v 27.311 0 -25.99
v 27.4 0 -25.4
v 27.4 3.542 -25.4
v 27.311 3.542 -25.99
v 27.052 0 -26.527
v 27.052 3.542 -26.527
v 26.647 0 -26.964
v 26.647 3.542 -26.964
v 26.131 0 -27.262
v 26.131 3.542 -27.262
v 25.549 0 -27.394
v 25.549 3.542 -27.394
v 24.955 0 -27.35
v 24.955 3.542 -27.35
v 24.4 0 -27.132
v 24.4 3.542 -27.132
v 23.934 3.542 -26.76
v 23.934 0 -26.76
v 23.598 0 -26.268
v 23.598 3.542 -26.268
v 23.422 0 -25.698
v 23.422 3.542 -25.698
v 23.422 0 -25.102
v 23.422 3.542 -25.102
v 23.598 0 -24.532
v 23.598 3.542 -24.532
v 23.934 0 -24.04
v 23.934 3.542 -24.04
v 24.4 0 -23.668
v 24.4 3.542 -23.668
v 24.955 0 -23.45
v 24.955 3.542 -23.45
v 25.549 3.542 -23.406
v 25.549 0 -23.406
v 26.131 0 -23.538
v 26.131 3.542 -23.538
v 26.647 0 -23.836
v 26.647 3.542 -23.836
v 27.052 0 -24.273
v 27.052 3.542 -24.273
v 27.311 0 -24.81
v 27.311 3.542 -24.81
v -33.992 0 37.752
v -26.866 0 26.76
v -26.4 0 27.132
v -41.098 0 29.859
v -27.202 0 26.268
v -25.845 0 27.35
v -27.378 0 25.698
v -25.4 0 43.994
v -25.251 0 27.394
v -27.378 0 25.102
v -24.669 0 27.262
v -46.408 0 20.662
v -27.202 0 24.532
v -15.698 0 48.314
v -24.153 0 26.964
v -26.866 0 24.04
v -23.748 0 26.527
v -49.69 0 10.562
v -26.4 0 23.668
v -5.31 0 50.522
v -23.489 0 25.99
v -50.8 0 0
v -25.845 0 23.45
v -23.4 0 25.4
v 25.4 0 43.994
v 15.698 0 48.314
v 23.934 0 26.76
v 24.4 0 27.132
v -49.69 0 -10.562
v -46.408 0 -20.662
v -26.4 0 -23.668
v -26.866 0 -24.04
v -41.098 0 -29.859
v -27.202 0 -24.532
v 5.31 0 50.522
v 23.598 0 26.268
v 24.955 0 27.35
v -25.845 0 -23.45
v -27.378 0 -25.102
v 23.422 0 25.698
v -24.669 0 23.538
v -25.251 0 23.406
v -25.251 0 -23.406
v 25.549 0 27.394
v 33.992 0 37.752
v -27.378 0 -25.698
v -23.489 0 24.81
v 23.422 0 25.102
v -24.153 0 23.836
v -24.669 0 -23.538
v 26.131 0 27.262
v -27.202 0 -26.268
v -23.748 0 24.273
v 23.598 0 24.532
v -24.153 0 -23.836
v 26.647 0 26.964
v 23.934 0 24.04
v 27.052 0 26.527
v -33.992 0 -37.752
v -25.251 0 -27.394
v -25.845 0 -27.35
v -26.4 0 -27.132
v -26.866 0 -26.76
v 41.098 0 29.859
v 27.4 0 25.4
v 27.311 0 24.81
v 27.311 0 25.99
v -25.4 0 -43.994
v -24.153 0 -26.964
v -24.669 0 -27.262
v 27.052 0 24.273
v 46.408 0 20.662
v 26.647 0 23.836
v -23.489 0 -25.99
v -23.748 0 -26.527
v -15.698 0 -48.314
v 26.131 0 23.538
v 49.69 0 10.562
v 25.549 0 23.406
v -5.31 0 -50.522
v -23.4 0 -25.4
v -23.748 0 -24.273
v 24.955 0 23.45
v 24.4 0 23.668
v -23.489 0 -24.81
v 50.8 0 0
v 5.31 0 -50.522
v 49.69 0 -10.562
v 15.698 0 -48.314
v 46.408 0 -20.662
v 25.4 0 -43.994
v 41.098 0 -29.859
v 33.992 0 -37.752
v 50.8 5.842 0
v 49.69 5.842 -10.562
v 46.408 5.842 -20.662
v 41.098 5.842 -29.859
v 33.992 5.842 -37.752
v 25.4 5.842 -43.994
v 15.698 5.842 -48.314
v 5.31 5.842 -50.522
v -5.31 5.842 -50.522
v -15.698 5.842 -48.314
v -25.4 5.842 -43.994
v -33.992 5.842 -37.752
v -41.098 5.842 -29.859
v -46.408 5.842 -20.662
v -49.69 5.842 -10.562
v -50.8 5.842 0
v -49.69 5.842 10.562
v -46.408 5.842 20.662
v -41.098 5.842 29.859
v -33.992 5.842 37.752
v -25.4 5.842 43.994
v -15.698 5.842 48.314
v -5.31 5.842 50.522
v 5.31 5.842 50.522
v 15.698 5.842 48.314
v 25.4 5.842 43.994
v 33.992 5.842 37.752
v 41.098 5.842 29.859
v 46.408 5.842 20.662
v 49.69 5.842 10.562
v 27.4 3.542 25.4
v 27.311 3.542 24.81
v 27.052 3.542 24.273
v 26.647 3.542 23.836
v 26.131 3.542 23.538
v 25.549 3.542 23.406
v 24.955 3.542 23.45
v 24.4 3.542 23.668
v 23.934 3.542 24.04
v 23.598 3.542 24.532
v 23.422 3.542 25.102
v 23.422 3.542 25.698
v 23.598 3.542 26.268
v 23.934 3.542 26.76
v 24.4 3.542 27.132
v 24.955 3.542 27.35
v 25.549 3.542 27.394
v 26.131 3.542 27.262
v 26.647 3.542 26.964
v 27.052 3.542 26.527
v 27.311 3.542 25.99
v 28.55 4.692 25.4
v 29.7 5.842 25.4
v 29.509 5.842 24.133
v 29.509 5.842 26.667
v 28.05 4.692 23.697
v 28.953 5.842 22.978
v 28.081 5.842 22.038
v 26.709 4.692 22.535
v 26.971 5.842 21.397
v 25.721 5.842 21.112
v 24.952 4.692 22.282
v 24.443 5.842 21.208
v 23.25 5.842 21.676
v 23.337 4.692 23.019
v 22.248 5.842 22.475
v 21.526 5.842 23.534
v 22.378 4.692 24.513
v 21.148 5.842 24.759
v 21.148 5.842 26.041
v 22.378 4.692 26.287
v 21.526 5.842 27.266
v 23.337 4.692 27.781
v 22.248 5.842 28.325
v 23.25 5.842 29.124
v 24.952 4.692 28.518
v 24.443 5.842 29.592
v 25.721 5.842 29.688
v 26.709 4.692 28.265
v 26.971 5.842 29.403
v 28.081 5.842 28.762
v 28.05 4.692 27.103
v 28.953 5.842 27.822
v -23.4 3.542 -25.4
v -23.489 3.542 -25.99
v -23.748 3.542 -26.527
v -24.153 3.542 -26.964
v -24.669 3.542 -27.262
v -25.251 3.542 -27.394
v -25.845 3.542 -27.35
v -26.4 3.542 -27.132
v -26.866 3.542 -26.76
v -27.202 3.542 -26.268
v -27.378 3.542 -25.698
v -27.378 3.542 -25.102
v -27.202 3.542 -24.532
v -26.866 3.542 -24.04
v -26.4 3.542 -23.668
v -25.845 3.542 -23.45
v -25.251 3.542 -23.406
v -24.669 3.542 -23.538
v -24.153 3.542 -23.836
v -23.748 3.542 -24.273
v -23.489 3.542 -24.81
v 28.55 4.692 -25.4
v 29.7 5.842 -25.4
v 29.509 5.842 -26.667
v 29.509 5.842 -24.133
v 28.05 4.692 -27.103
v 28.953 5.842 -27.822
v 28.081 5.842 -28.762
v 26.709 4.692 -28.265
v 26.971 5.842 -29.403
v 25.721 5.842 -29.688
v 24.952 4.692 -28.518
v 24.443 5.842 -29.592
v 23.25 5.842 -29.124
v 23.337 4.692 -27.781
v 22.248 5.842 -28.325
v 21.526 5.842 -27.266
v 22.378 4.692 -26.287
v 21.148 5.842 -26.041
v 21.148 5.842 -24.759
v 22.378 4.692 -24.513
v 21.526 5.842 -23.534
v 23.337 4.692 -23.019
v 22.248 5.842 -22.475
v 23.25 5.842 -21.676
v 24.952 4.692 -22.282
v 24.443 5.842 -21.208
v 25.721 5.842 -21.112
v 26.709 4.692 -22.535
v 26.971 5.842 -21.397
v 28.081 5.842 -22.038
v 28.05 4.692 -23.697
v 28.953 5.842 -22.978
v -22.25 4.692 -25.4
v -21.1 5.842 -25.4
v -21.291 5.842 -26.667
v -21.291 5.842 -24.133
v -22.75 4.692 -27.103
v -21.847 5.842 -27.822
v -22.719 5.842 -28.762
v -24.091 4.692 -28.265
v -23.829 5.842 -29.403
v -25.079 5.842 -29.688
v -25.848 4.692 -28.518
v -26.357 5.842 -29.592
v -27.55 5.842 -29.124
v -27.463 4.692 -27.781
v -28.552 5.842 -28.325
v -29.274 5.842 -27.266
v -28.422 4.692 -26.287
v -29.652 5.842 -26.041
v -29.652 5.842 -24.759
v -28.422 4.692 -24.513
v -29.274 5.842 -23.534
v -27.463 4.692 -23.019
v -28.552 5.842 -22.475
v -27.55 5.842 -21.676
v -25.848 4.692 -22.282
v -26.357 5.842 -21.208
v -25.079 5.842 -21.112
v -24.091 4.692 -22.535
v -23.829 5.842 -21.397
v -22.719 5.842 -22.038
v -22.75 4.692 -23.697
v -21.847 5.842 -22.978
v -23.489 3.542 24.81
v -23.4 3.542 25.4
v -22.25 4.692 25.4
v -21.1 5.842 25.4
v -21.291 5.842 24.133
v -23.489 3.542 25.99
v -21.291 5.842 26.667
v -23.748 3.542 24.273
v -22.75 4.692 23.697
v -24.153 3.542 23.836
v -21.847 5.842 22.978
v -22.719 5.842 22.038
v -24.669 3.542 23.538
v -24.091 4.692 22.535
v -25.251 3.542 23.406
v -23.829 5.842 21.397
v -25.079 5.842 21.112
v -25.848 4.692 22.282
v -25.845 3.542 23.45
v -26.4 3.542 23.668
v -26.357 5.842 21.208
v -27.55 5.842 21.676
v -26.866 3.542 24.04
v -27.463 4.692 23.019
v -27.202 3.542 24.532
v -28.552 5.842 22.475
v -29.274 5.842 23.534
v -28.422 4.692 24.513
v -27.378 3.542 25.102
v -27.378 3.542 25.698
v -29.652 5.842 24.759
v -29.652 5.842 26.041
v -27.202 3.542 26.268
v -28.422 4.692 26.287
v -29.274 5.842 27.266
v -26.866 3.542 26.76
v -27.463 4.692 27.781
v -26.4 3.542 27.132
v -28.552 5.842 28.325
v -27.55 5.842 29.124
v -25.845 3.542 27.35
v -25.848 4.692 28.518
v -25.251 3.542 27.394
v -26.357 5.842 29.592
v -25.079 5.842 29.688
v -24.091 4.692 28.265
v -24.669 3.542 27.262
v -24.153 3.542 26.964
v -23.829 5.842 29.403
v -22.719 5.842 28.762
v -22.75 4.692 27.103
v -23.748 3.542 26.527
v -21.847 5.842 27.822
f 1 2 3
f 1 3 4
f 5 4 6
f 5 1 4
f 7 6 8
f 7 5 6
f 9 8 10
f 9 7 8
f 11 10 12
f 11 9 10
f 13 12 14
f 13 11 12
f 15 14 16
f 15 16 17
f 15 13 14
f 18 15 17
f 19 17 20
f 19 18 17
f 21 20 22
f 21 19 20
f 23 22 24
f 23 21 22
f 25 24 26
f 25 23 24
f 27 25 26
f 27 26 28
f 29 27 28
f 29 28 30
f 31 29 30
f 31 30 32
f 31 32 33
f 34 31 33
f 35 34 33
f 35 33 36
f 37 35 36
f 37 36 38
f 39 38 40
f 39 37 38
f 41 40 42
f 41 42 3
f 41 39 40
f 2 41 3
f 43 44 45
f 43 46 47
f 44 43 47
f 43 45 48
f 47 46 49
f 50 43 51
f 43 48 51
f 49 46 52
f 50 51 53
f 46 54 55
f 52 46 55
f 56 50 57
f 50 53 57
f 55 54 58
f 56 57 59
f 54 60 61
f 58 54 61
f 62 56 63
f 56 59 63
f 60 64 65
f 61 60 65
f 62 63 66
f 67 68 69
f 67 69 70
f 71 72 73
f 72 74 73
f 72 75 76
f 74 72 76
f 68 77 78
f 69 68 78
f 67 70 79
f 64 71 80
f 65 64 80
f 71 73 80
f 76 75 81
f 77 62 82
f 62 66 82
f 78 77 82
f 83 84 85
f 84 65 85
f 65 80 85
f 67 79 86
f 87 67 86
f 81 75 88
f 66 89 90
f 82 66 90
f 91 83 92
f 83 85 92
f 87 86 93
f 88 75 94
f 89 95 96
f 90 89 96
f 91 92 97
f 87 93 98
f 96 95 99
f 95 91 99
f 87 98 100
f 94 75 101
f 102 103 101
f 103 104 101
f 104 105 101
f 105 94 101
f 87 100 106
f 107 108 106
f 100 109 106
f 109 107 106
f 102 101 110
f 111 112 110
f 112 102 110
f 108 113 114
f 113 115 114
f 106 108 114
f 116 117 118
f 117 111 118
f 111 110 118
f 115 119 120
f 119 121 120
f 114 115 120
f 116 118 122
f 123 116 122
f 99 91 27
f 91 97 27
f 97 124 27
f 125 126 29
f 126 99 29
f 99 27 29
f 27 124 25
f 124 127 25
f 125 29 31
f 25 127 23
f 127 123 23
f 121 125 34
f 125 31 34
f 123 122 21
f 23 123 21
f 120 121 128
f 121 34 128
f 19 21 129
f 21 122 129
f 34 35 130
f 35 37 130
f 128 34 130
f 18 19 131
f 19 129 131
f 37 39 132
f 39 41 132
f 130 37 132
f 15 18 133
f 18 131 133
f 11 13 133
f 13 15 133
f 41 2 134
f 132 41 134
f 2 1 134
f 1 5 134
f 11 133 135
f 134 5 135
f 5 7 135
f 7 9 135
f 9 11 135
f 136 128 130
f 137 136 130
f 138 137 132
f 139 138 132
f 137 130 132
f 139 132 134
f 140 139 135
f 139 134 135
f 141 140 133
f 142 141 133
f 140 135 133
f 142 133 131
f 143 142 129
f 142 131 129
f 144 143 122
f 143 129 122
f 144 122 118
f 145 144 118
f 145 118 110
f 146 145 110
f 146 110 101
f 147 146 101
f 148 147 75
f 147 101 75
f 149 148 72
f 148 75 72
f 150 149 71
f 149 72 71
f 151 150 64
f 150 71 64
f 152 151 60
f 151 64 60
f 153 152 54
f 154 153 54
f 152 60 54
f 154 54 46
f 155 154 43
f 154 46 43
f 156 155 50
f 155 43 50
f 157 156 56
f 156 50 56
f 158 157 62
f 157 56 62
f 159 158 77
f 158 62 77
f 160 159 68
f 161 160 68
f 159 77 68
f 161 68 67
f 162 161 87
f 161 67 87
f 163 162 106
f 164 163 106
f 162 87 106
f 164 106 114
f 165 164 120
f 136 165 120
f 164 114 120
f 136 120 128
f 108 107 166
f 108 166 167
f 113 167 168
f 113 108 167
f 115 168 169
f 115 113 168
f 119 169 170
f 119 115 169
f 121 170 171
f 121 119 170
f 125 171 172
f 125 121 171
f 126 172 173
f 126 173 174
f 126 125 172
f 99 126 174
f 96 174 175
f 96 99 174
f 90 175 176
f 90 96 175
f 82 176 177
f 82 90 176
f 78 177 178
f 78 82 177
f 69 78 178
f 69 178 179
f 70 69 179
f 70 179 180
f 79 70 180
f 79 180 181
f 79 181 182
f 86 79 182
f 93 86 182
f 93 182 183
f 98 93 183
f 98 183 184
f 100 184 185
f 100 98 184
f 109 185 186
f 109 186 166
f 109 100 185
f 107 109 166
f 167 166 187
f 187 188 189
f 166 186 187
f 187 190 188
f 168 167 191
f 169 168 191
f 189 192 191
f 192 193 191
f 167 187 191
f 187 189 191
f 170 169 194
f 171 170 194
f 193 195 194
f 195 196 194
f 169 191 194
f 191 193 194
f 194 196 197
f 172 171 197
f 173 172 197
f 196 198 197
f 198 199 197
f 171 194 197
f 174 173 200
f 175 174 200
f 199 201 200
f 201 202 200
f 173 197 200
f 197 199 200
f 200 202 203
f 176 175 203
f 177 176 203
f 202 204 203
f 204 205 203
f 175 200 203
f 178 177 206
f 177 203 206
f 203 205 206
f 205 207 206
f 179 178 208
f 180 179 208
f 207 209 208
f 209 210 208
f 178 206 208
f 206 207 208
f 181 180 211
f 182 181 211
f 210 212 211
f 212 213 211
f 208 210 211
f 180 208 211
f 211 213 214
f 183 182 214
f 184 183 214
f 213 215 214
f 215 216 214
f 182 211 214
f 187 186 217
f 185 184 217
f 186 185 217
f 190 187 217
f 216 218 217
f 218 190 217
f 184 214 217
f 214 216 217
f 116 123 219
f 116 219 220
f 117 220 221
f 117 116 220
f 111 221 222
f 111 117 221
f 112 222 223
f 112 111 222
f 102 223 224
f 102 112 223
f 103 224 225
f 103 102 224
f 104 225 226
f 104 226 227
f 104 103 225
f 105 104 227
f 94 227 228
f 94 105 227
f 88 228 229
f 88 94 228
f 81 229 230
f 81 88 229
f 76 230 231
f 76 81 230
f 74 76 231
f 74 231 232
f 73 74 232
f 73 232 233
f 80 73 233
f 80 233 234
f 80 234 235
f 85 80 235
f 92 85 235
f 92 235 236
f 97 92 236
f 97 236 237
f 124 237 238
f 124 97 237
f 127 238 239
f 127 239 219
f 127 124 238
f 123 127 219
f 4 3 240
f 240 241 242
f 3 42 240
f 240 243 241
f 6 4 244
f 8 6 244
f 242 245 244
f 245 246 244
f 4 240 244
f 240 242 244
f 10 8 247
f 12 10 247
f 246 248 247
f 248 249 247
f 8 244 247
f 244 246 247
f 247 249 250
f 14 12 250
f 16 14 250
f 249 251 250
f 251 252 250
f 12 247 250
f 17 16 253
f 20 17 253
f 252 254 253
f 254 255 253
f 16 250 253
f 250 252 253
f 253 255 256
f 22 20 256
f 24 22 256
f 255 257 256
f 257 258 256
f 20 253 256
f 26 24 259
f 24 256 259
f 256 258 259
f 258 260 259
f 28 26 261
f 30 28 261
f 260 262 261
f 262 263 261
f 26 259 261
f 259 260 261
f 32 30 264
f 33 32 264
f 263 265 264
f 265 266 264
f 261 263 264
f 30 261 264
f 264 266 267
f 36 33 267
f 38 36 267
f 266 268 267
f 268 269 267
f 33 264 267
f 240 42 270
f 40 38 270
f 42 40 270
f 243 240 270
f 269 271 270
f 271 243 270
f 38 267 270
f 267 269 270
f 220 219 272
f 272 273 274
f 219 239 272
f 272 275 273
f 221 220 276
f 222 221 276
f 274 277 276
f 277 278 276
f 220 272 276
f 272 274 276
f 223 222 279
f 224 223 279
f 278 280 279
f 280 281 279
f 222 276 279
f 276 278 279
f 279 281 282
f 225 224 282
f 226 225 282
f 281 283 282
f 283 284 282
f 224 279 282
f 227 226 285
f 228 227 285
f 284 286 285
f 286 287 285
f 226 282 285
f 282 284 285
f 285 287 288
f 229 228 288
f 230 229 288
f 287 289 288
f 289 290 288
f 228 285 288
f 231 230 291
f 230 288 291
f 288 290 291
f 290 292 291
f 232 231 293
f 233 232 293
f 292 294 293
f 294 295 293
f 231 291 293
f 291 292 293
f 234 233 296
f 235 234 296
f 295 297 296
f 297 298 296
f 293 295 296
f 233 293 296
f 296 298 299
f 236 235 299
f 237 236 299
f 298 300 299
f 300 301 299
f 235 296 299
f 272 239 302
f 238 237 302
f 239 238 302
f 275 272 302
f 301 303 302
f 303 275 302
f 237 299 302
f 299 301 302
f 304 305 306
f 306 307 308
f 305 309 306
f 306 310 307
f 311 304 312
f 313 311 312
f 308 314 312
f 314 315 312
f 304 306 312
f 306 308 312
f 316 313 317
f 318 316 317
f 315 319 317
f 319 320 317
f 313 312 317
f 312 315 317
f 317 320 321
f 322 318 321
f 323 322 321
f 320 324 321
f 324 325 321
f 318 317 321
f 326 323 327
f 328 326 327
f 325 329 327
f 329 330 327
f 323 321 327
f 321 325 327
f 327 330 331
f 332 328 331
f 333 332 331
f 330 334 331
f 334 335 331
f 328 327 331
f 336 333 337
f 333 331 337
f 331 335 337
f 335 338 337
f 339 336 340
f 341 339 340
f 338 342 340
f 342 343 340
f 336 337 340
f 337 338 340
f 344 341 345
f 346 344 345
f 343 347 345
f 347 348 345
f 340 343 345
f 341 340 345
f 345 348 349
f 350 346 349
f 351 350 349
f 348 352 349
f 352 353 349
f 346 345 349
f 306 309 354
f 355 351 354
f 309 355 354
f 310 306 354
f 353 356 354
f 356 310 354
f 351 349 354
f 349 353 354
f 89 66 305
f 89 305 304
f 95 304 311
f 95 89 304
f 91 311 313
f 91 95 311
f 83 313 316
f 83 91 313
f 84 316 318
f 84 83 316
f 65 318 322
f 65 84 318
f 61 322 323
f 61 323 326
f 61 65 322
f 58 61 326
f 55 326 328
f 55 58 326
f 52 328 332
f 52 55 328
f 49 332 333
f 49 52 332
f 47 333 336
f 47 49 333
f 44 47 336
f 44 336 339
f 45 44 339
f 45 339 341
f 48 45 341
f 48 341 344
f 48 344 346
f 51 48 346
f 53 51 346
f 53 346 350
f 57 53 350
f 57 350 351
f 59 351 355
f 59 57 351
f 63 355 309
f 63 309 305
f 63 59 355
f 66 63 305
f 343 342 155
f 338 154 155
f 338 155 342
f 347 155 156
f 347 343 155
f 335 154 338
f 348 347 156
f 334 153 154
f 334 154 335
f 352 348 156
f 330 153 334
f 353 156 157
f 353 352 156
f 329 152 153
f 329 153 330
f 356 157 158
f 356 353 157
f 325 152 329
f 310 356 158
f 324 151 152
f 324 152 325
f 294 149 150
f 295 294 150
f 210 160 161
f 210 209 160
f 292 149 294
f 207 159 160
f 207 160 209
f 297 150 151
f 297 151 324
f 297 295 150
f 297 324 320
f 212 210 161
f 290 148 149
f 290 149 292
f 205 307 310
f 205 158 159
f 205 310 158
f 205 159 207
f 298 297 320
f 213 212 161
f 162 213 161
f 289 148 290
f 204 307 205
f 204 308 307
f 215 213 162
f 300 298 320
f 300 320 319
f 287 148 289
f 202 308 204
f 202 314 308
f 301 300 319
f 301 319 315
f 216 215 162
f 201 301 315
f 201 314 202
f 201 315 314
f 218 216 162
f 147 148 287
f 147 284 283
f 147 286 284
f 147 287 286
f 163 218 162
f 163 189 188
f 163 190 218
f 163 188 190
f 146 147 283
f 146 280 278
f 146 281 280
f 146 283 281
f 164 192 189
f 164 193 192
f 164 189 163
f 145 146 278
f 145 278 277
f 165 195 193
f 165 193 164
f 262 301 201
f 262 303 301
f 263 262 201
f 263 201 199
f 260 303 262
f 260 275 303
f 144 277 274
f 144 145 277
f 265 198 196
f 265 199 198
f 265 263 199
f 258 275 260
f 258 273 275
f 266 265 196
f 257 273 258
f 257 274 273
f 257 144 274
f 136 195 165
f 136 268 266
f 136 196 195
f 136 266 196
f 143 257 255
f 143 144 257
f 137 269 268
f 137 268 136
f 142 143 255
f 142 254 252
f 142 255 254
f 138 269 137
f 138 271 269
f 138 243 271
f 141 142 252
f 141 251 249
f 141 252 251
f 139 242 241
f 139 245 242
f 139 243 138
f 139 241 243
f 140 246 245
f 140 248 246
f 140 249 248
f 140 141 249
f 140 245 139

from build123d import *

# Parameters (mm, degrees)
SKETCH1_R           = 50.8
SKETCH1_R_2         = 2
BOSS_EXTRUDE1_DEPTH = 5.842
CHAMFER1_SIZE       = 2.3


with BuildPart() as part:
    # Sketch1 → Boss-Extrude1 (new body)
    with BuildSketch(Plane(origin=(0, 0, 0), x_dir=(1, 0, 0), z_dir=(0, 1, 0))):
        Circle(SKETCH1_R)
        with Locations((-25.4, 25.4)):
            Circle(SKETCH1_R_2, mode=Mode.SUBTRACT)
        with Locations((25.4, 25.4)):
            Circle(SKETCH1_R_2, mode=Mode.SUBTRACT)
        with Locations((25.4, -25.4)):
            Circle(SKETCH1_R_2, mode=Mode.SUBTRACT)
        with Locations((-25.4, -25.4)):
            Circle(SKETCH1_R_2, mode=Mode.SUBTRACT)
    extrude(amount=BOSS_EXTRUDE1_DEPTH)

    # Chamfer1
    chamfer1_edges = [part.edges().sort_by_distance(p)[0] for p in [
        (23.4, 5.842, -25.4),
        (23.4, 5.842, 25.4),
        (-27.4, 5.842, -25.4),
        (-27.4, 5.842, 25.4),
    ]]
    chamfer(chamfer1_edges, length=CHAMFER1_SIZE)


solid = part.part
